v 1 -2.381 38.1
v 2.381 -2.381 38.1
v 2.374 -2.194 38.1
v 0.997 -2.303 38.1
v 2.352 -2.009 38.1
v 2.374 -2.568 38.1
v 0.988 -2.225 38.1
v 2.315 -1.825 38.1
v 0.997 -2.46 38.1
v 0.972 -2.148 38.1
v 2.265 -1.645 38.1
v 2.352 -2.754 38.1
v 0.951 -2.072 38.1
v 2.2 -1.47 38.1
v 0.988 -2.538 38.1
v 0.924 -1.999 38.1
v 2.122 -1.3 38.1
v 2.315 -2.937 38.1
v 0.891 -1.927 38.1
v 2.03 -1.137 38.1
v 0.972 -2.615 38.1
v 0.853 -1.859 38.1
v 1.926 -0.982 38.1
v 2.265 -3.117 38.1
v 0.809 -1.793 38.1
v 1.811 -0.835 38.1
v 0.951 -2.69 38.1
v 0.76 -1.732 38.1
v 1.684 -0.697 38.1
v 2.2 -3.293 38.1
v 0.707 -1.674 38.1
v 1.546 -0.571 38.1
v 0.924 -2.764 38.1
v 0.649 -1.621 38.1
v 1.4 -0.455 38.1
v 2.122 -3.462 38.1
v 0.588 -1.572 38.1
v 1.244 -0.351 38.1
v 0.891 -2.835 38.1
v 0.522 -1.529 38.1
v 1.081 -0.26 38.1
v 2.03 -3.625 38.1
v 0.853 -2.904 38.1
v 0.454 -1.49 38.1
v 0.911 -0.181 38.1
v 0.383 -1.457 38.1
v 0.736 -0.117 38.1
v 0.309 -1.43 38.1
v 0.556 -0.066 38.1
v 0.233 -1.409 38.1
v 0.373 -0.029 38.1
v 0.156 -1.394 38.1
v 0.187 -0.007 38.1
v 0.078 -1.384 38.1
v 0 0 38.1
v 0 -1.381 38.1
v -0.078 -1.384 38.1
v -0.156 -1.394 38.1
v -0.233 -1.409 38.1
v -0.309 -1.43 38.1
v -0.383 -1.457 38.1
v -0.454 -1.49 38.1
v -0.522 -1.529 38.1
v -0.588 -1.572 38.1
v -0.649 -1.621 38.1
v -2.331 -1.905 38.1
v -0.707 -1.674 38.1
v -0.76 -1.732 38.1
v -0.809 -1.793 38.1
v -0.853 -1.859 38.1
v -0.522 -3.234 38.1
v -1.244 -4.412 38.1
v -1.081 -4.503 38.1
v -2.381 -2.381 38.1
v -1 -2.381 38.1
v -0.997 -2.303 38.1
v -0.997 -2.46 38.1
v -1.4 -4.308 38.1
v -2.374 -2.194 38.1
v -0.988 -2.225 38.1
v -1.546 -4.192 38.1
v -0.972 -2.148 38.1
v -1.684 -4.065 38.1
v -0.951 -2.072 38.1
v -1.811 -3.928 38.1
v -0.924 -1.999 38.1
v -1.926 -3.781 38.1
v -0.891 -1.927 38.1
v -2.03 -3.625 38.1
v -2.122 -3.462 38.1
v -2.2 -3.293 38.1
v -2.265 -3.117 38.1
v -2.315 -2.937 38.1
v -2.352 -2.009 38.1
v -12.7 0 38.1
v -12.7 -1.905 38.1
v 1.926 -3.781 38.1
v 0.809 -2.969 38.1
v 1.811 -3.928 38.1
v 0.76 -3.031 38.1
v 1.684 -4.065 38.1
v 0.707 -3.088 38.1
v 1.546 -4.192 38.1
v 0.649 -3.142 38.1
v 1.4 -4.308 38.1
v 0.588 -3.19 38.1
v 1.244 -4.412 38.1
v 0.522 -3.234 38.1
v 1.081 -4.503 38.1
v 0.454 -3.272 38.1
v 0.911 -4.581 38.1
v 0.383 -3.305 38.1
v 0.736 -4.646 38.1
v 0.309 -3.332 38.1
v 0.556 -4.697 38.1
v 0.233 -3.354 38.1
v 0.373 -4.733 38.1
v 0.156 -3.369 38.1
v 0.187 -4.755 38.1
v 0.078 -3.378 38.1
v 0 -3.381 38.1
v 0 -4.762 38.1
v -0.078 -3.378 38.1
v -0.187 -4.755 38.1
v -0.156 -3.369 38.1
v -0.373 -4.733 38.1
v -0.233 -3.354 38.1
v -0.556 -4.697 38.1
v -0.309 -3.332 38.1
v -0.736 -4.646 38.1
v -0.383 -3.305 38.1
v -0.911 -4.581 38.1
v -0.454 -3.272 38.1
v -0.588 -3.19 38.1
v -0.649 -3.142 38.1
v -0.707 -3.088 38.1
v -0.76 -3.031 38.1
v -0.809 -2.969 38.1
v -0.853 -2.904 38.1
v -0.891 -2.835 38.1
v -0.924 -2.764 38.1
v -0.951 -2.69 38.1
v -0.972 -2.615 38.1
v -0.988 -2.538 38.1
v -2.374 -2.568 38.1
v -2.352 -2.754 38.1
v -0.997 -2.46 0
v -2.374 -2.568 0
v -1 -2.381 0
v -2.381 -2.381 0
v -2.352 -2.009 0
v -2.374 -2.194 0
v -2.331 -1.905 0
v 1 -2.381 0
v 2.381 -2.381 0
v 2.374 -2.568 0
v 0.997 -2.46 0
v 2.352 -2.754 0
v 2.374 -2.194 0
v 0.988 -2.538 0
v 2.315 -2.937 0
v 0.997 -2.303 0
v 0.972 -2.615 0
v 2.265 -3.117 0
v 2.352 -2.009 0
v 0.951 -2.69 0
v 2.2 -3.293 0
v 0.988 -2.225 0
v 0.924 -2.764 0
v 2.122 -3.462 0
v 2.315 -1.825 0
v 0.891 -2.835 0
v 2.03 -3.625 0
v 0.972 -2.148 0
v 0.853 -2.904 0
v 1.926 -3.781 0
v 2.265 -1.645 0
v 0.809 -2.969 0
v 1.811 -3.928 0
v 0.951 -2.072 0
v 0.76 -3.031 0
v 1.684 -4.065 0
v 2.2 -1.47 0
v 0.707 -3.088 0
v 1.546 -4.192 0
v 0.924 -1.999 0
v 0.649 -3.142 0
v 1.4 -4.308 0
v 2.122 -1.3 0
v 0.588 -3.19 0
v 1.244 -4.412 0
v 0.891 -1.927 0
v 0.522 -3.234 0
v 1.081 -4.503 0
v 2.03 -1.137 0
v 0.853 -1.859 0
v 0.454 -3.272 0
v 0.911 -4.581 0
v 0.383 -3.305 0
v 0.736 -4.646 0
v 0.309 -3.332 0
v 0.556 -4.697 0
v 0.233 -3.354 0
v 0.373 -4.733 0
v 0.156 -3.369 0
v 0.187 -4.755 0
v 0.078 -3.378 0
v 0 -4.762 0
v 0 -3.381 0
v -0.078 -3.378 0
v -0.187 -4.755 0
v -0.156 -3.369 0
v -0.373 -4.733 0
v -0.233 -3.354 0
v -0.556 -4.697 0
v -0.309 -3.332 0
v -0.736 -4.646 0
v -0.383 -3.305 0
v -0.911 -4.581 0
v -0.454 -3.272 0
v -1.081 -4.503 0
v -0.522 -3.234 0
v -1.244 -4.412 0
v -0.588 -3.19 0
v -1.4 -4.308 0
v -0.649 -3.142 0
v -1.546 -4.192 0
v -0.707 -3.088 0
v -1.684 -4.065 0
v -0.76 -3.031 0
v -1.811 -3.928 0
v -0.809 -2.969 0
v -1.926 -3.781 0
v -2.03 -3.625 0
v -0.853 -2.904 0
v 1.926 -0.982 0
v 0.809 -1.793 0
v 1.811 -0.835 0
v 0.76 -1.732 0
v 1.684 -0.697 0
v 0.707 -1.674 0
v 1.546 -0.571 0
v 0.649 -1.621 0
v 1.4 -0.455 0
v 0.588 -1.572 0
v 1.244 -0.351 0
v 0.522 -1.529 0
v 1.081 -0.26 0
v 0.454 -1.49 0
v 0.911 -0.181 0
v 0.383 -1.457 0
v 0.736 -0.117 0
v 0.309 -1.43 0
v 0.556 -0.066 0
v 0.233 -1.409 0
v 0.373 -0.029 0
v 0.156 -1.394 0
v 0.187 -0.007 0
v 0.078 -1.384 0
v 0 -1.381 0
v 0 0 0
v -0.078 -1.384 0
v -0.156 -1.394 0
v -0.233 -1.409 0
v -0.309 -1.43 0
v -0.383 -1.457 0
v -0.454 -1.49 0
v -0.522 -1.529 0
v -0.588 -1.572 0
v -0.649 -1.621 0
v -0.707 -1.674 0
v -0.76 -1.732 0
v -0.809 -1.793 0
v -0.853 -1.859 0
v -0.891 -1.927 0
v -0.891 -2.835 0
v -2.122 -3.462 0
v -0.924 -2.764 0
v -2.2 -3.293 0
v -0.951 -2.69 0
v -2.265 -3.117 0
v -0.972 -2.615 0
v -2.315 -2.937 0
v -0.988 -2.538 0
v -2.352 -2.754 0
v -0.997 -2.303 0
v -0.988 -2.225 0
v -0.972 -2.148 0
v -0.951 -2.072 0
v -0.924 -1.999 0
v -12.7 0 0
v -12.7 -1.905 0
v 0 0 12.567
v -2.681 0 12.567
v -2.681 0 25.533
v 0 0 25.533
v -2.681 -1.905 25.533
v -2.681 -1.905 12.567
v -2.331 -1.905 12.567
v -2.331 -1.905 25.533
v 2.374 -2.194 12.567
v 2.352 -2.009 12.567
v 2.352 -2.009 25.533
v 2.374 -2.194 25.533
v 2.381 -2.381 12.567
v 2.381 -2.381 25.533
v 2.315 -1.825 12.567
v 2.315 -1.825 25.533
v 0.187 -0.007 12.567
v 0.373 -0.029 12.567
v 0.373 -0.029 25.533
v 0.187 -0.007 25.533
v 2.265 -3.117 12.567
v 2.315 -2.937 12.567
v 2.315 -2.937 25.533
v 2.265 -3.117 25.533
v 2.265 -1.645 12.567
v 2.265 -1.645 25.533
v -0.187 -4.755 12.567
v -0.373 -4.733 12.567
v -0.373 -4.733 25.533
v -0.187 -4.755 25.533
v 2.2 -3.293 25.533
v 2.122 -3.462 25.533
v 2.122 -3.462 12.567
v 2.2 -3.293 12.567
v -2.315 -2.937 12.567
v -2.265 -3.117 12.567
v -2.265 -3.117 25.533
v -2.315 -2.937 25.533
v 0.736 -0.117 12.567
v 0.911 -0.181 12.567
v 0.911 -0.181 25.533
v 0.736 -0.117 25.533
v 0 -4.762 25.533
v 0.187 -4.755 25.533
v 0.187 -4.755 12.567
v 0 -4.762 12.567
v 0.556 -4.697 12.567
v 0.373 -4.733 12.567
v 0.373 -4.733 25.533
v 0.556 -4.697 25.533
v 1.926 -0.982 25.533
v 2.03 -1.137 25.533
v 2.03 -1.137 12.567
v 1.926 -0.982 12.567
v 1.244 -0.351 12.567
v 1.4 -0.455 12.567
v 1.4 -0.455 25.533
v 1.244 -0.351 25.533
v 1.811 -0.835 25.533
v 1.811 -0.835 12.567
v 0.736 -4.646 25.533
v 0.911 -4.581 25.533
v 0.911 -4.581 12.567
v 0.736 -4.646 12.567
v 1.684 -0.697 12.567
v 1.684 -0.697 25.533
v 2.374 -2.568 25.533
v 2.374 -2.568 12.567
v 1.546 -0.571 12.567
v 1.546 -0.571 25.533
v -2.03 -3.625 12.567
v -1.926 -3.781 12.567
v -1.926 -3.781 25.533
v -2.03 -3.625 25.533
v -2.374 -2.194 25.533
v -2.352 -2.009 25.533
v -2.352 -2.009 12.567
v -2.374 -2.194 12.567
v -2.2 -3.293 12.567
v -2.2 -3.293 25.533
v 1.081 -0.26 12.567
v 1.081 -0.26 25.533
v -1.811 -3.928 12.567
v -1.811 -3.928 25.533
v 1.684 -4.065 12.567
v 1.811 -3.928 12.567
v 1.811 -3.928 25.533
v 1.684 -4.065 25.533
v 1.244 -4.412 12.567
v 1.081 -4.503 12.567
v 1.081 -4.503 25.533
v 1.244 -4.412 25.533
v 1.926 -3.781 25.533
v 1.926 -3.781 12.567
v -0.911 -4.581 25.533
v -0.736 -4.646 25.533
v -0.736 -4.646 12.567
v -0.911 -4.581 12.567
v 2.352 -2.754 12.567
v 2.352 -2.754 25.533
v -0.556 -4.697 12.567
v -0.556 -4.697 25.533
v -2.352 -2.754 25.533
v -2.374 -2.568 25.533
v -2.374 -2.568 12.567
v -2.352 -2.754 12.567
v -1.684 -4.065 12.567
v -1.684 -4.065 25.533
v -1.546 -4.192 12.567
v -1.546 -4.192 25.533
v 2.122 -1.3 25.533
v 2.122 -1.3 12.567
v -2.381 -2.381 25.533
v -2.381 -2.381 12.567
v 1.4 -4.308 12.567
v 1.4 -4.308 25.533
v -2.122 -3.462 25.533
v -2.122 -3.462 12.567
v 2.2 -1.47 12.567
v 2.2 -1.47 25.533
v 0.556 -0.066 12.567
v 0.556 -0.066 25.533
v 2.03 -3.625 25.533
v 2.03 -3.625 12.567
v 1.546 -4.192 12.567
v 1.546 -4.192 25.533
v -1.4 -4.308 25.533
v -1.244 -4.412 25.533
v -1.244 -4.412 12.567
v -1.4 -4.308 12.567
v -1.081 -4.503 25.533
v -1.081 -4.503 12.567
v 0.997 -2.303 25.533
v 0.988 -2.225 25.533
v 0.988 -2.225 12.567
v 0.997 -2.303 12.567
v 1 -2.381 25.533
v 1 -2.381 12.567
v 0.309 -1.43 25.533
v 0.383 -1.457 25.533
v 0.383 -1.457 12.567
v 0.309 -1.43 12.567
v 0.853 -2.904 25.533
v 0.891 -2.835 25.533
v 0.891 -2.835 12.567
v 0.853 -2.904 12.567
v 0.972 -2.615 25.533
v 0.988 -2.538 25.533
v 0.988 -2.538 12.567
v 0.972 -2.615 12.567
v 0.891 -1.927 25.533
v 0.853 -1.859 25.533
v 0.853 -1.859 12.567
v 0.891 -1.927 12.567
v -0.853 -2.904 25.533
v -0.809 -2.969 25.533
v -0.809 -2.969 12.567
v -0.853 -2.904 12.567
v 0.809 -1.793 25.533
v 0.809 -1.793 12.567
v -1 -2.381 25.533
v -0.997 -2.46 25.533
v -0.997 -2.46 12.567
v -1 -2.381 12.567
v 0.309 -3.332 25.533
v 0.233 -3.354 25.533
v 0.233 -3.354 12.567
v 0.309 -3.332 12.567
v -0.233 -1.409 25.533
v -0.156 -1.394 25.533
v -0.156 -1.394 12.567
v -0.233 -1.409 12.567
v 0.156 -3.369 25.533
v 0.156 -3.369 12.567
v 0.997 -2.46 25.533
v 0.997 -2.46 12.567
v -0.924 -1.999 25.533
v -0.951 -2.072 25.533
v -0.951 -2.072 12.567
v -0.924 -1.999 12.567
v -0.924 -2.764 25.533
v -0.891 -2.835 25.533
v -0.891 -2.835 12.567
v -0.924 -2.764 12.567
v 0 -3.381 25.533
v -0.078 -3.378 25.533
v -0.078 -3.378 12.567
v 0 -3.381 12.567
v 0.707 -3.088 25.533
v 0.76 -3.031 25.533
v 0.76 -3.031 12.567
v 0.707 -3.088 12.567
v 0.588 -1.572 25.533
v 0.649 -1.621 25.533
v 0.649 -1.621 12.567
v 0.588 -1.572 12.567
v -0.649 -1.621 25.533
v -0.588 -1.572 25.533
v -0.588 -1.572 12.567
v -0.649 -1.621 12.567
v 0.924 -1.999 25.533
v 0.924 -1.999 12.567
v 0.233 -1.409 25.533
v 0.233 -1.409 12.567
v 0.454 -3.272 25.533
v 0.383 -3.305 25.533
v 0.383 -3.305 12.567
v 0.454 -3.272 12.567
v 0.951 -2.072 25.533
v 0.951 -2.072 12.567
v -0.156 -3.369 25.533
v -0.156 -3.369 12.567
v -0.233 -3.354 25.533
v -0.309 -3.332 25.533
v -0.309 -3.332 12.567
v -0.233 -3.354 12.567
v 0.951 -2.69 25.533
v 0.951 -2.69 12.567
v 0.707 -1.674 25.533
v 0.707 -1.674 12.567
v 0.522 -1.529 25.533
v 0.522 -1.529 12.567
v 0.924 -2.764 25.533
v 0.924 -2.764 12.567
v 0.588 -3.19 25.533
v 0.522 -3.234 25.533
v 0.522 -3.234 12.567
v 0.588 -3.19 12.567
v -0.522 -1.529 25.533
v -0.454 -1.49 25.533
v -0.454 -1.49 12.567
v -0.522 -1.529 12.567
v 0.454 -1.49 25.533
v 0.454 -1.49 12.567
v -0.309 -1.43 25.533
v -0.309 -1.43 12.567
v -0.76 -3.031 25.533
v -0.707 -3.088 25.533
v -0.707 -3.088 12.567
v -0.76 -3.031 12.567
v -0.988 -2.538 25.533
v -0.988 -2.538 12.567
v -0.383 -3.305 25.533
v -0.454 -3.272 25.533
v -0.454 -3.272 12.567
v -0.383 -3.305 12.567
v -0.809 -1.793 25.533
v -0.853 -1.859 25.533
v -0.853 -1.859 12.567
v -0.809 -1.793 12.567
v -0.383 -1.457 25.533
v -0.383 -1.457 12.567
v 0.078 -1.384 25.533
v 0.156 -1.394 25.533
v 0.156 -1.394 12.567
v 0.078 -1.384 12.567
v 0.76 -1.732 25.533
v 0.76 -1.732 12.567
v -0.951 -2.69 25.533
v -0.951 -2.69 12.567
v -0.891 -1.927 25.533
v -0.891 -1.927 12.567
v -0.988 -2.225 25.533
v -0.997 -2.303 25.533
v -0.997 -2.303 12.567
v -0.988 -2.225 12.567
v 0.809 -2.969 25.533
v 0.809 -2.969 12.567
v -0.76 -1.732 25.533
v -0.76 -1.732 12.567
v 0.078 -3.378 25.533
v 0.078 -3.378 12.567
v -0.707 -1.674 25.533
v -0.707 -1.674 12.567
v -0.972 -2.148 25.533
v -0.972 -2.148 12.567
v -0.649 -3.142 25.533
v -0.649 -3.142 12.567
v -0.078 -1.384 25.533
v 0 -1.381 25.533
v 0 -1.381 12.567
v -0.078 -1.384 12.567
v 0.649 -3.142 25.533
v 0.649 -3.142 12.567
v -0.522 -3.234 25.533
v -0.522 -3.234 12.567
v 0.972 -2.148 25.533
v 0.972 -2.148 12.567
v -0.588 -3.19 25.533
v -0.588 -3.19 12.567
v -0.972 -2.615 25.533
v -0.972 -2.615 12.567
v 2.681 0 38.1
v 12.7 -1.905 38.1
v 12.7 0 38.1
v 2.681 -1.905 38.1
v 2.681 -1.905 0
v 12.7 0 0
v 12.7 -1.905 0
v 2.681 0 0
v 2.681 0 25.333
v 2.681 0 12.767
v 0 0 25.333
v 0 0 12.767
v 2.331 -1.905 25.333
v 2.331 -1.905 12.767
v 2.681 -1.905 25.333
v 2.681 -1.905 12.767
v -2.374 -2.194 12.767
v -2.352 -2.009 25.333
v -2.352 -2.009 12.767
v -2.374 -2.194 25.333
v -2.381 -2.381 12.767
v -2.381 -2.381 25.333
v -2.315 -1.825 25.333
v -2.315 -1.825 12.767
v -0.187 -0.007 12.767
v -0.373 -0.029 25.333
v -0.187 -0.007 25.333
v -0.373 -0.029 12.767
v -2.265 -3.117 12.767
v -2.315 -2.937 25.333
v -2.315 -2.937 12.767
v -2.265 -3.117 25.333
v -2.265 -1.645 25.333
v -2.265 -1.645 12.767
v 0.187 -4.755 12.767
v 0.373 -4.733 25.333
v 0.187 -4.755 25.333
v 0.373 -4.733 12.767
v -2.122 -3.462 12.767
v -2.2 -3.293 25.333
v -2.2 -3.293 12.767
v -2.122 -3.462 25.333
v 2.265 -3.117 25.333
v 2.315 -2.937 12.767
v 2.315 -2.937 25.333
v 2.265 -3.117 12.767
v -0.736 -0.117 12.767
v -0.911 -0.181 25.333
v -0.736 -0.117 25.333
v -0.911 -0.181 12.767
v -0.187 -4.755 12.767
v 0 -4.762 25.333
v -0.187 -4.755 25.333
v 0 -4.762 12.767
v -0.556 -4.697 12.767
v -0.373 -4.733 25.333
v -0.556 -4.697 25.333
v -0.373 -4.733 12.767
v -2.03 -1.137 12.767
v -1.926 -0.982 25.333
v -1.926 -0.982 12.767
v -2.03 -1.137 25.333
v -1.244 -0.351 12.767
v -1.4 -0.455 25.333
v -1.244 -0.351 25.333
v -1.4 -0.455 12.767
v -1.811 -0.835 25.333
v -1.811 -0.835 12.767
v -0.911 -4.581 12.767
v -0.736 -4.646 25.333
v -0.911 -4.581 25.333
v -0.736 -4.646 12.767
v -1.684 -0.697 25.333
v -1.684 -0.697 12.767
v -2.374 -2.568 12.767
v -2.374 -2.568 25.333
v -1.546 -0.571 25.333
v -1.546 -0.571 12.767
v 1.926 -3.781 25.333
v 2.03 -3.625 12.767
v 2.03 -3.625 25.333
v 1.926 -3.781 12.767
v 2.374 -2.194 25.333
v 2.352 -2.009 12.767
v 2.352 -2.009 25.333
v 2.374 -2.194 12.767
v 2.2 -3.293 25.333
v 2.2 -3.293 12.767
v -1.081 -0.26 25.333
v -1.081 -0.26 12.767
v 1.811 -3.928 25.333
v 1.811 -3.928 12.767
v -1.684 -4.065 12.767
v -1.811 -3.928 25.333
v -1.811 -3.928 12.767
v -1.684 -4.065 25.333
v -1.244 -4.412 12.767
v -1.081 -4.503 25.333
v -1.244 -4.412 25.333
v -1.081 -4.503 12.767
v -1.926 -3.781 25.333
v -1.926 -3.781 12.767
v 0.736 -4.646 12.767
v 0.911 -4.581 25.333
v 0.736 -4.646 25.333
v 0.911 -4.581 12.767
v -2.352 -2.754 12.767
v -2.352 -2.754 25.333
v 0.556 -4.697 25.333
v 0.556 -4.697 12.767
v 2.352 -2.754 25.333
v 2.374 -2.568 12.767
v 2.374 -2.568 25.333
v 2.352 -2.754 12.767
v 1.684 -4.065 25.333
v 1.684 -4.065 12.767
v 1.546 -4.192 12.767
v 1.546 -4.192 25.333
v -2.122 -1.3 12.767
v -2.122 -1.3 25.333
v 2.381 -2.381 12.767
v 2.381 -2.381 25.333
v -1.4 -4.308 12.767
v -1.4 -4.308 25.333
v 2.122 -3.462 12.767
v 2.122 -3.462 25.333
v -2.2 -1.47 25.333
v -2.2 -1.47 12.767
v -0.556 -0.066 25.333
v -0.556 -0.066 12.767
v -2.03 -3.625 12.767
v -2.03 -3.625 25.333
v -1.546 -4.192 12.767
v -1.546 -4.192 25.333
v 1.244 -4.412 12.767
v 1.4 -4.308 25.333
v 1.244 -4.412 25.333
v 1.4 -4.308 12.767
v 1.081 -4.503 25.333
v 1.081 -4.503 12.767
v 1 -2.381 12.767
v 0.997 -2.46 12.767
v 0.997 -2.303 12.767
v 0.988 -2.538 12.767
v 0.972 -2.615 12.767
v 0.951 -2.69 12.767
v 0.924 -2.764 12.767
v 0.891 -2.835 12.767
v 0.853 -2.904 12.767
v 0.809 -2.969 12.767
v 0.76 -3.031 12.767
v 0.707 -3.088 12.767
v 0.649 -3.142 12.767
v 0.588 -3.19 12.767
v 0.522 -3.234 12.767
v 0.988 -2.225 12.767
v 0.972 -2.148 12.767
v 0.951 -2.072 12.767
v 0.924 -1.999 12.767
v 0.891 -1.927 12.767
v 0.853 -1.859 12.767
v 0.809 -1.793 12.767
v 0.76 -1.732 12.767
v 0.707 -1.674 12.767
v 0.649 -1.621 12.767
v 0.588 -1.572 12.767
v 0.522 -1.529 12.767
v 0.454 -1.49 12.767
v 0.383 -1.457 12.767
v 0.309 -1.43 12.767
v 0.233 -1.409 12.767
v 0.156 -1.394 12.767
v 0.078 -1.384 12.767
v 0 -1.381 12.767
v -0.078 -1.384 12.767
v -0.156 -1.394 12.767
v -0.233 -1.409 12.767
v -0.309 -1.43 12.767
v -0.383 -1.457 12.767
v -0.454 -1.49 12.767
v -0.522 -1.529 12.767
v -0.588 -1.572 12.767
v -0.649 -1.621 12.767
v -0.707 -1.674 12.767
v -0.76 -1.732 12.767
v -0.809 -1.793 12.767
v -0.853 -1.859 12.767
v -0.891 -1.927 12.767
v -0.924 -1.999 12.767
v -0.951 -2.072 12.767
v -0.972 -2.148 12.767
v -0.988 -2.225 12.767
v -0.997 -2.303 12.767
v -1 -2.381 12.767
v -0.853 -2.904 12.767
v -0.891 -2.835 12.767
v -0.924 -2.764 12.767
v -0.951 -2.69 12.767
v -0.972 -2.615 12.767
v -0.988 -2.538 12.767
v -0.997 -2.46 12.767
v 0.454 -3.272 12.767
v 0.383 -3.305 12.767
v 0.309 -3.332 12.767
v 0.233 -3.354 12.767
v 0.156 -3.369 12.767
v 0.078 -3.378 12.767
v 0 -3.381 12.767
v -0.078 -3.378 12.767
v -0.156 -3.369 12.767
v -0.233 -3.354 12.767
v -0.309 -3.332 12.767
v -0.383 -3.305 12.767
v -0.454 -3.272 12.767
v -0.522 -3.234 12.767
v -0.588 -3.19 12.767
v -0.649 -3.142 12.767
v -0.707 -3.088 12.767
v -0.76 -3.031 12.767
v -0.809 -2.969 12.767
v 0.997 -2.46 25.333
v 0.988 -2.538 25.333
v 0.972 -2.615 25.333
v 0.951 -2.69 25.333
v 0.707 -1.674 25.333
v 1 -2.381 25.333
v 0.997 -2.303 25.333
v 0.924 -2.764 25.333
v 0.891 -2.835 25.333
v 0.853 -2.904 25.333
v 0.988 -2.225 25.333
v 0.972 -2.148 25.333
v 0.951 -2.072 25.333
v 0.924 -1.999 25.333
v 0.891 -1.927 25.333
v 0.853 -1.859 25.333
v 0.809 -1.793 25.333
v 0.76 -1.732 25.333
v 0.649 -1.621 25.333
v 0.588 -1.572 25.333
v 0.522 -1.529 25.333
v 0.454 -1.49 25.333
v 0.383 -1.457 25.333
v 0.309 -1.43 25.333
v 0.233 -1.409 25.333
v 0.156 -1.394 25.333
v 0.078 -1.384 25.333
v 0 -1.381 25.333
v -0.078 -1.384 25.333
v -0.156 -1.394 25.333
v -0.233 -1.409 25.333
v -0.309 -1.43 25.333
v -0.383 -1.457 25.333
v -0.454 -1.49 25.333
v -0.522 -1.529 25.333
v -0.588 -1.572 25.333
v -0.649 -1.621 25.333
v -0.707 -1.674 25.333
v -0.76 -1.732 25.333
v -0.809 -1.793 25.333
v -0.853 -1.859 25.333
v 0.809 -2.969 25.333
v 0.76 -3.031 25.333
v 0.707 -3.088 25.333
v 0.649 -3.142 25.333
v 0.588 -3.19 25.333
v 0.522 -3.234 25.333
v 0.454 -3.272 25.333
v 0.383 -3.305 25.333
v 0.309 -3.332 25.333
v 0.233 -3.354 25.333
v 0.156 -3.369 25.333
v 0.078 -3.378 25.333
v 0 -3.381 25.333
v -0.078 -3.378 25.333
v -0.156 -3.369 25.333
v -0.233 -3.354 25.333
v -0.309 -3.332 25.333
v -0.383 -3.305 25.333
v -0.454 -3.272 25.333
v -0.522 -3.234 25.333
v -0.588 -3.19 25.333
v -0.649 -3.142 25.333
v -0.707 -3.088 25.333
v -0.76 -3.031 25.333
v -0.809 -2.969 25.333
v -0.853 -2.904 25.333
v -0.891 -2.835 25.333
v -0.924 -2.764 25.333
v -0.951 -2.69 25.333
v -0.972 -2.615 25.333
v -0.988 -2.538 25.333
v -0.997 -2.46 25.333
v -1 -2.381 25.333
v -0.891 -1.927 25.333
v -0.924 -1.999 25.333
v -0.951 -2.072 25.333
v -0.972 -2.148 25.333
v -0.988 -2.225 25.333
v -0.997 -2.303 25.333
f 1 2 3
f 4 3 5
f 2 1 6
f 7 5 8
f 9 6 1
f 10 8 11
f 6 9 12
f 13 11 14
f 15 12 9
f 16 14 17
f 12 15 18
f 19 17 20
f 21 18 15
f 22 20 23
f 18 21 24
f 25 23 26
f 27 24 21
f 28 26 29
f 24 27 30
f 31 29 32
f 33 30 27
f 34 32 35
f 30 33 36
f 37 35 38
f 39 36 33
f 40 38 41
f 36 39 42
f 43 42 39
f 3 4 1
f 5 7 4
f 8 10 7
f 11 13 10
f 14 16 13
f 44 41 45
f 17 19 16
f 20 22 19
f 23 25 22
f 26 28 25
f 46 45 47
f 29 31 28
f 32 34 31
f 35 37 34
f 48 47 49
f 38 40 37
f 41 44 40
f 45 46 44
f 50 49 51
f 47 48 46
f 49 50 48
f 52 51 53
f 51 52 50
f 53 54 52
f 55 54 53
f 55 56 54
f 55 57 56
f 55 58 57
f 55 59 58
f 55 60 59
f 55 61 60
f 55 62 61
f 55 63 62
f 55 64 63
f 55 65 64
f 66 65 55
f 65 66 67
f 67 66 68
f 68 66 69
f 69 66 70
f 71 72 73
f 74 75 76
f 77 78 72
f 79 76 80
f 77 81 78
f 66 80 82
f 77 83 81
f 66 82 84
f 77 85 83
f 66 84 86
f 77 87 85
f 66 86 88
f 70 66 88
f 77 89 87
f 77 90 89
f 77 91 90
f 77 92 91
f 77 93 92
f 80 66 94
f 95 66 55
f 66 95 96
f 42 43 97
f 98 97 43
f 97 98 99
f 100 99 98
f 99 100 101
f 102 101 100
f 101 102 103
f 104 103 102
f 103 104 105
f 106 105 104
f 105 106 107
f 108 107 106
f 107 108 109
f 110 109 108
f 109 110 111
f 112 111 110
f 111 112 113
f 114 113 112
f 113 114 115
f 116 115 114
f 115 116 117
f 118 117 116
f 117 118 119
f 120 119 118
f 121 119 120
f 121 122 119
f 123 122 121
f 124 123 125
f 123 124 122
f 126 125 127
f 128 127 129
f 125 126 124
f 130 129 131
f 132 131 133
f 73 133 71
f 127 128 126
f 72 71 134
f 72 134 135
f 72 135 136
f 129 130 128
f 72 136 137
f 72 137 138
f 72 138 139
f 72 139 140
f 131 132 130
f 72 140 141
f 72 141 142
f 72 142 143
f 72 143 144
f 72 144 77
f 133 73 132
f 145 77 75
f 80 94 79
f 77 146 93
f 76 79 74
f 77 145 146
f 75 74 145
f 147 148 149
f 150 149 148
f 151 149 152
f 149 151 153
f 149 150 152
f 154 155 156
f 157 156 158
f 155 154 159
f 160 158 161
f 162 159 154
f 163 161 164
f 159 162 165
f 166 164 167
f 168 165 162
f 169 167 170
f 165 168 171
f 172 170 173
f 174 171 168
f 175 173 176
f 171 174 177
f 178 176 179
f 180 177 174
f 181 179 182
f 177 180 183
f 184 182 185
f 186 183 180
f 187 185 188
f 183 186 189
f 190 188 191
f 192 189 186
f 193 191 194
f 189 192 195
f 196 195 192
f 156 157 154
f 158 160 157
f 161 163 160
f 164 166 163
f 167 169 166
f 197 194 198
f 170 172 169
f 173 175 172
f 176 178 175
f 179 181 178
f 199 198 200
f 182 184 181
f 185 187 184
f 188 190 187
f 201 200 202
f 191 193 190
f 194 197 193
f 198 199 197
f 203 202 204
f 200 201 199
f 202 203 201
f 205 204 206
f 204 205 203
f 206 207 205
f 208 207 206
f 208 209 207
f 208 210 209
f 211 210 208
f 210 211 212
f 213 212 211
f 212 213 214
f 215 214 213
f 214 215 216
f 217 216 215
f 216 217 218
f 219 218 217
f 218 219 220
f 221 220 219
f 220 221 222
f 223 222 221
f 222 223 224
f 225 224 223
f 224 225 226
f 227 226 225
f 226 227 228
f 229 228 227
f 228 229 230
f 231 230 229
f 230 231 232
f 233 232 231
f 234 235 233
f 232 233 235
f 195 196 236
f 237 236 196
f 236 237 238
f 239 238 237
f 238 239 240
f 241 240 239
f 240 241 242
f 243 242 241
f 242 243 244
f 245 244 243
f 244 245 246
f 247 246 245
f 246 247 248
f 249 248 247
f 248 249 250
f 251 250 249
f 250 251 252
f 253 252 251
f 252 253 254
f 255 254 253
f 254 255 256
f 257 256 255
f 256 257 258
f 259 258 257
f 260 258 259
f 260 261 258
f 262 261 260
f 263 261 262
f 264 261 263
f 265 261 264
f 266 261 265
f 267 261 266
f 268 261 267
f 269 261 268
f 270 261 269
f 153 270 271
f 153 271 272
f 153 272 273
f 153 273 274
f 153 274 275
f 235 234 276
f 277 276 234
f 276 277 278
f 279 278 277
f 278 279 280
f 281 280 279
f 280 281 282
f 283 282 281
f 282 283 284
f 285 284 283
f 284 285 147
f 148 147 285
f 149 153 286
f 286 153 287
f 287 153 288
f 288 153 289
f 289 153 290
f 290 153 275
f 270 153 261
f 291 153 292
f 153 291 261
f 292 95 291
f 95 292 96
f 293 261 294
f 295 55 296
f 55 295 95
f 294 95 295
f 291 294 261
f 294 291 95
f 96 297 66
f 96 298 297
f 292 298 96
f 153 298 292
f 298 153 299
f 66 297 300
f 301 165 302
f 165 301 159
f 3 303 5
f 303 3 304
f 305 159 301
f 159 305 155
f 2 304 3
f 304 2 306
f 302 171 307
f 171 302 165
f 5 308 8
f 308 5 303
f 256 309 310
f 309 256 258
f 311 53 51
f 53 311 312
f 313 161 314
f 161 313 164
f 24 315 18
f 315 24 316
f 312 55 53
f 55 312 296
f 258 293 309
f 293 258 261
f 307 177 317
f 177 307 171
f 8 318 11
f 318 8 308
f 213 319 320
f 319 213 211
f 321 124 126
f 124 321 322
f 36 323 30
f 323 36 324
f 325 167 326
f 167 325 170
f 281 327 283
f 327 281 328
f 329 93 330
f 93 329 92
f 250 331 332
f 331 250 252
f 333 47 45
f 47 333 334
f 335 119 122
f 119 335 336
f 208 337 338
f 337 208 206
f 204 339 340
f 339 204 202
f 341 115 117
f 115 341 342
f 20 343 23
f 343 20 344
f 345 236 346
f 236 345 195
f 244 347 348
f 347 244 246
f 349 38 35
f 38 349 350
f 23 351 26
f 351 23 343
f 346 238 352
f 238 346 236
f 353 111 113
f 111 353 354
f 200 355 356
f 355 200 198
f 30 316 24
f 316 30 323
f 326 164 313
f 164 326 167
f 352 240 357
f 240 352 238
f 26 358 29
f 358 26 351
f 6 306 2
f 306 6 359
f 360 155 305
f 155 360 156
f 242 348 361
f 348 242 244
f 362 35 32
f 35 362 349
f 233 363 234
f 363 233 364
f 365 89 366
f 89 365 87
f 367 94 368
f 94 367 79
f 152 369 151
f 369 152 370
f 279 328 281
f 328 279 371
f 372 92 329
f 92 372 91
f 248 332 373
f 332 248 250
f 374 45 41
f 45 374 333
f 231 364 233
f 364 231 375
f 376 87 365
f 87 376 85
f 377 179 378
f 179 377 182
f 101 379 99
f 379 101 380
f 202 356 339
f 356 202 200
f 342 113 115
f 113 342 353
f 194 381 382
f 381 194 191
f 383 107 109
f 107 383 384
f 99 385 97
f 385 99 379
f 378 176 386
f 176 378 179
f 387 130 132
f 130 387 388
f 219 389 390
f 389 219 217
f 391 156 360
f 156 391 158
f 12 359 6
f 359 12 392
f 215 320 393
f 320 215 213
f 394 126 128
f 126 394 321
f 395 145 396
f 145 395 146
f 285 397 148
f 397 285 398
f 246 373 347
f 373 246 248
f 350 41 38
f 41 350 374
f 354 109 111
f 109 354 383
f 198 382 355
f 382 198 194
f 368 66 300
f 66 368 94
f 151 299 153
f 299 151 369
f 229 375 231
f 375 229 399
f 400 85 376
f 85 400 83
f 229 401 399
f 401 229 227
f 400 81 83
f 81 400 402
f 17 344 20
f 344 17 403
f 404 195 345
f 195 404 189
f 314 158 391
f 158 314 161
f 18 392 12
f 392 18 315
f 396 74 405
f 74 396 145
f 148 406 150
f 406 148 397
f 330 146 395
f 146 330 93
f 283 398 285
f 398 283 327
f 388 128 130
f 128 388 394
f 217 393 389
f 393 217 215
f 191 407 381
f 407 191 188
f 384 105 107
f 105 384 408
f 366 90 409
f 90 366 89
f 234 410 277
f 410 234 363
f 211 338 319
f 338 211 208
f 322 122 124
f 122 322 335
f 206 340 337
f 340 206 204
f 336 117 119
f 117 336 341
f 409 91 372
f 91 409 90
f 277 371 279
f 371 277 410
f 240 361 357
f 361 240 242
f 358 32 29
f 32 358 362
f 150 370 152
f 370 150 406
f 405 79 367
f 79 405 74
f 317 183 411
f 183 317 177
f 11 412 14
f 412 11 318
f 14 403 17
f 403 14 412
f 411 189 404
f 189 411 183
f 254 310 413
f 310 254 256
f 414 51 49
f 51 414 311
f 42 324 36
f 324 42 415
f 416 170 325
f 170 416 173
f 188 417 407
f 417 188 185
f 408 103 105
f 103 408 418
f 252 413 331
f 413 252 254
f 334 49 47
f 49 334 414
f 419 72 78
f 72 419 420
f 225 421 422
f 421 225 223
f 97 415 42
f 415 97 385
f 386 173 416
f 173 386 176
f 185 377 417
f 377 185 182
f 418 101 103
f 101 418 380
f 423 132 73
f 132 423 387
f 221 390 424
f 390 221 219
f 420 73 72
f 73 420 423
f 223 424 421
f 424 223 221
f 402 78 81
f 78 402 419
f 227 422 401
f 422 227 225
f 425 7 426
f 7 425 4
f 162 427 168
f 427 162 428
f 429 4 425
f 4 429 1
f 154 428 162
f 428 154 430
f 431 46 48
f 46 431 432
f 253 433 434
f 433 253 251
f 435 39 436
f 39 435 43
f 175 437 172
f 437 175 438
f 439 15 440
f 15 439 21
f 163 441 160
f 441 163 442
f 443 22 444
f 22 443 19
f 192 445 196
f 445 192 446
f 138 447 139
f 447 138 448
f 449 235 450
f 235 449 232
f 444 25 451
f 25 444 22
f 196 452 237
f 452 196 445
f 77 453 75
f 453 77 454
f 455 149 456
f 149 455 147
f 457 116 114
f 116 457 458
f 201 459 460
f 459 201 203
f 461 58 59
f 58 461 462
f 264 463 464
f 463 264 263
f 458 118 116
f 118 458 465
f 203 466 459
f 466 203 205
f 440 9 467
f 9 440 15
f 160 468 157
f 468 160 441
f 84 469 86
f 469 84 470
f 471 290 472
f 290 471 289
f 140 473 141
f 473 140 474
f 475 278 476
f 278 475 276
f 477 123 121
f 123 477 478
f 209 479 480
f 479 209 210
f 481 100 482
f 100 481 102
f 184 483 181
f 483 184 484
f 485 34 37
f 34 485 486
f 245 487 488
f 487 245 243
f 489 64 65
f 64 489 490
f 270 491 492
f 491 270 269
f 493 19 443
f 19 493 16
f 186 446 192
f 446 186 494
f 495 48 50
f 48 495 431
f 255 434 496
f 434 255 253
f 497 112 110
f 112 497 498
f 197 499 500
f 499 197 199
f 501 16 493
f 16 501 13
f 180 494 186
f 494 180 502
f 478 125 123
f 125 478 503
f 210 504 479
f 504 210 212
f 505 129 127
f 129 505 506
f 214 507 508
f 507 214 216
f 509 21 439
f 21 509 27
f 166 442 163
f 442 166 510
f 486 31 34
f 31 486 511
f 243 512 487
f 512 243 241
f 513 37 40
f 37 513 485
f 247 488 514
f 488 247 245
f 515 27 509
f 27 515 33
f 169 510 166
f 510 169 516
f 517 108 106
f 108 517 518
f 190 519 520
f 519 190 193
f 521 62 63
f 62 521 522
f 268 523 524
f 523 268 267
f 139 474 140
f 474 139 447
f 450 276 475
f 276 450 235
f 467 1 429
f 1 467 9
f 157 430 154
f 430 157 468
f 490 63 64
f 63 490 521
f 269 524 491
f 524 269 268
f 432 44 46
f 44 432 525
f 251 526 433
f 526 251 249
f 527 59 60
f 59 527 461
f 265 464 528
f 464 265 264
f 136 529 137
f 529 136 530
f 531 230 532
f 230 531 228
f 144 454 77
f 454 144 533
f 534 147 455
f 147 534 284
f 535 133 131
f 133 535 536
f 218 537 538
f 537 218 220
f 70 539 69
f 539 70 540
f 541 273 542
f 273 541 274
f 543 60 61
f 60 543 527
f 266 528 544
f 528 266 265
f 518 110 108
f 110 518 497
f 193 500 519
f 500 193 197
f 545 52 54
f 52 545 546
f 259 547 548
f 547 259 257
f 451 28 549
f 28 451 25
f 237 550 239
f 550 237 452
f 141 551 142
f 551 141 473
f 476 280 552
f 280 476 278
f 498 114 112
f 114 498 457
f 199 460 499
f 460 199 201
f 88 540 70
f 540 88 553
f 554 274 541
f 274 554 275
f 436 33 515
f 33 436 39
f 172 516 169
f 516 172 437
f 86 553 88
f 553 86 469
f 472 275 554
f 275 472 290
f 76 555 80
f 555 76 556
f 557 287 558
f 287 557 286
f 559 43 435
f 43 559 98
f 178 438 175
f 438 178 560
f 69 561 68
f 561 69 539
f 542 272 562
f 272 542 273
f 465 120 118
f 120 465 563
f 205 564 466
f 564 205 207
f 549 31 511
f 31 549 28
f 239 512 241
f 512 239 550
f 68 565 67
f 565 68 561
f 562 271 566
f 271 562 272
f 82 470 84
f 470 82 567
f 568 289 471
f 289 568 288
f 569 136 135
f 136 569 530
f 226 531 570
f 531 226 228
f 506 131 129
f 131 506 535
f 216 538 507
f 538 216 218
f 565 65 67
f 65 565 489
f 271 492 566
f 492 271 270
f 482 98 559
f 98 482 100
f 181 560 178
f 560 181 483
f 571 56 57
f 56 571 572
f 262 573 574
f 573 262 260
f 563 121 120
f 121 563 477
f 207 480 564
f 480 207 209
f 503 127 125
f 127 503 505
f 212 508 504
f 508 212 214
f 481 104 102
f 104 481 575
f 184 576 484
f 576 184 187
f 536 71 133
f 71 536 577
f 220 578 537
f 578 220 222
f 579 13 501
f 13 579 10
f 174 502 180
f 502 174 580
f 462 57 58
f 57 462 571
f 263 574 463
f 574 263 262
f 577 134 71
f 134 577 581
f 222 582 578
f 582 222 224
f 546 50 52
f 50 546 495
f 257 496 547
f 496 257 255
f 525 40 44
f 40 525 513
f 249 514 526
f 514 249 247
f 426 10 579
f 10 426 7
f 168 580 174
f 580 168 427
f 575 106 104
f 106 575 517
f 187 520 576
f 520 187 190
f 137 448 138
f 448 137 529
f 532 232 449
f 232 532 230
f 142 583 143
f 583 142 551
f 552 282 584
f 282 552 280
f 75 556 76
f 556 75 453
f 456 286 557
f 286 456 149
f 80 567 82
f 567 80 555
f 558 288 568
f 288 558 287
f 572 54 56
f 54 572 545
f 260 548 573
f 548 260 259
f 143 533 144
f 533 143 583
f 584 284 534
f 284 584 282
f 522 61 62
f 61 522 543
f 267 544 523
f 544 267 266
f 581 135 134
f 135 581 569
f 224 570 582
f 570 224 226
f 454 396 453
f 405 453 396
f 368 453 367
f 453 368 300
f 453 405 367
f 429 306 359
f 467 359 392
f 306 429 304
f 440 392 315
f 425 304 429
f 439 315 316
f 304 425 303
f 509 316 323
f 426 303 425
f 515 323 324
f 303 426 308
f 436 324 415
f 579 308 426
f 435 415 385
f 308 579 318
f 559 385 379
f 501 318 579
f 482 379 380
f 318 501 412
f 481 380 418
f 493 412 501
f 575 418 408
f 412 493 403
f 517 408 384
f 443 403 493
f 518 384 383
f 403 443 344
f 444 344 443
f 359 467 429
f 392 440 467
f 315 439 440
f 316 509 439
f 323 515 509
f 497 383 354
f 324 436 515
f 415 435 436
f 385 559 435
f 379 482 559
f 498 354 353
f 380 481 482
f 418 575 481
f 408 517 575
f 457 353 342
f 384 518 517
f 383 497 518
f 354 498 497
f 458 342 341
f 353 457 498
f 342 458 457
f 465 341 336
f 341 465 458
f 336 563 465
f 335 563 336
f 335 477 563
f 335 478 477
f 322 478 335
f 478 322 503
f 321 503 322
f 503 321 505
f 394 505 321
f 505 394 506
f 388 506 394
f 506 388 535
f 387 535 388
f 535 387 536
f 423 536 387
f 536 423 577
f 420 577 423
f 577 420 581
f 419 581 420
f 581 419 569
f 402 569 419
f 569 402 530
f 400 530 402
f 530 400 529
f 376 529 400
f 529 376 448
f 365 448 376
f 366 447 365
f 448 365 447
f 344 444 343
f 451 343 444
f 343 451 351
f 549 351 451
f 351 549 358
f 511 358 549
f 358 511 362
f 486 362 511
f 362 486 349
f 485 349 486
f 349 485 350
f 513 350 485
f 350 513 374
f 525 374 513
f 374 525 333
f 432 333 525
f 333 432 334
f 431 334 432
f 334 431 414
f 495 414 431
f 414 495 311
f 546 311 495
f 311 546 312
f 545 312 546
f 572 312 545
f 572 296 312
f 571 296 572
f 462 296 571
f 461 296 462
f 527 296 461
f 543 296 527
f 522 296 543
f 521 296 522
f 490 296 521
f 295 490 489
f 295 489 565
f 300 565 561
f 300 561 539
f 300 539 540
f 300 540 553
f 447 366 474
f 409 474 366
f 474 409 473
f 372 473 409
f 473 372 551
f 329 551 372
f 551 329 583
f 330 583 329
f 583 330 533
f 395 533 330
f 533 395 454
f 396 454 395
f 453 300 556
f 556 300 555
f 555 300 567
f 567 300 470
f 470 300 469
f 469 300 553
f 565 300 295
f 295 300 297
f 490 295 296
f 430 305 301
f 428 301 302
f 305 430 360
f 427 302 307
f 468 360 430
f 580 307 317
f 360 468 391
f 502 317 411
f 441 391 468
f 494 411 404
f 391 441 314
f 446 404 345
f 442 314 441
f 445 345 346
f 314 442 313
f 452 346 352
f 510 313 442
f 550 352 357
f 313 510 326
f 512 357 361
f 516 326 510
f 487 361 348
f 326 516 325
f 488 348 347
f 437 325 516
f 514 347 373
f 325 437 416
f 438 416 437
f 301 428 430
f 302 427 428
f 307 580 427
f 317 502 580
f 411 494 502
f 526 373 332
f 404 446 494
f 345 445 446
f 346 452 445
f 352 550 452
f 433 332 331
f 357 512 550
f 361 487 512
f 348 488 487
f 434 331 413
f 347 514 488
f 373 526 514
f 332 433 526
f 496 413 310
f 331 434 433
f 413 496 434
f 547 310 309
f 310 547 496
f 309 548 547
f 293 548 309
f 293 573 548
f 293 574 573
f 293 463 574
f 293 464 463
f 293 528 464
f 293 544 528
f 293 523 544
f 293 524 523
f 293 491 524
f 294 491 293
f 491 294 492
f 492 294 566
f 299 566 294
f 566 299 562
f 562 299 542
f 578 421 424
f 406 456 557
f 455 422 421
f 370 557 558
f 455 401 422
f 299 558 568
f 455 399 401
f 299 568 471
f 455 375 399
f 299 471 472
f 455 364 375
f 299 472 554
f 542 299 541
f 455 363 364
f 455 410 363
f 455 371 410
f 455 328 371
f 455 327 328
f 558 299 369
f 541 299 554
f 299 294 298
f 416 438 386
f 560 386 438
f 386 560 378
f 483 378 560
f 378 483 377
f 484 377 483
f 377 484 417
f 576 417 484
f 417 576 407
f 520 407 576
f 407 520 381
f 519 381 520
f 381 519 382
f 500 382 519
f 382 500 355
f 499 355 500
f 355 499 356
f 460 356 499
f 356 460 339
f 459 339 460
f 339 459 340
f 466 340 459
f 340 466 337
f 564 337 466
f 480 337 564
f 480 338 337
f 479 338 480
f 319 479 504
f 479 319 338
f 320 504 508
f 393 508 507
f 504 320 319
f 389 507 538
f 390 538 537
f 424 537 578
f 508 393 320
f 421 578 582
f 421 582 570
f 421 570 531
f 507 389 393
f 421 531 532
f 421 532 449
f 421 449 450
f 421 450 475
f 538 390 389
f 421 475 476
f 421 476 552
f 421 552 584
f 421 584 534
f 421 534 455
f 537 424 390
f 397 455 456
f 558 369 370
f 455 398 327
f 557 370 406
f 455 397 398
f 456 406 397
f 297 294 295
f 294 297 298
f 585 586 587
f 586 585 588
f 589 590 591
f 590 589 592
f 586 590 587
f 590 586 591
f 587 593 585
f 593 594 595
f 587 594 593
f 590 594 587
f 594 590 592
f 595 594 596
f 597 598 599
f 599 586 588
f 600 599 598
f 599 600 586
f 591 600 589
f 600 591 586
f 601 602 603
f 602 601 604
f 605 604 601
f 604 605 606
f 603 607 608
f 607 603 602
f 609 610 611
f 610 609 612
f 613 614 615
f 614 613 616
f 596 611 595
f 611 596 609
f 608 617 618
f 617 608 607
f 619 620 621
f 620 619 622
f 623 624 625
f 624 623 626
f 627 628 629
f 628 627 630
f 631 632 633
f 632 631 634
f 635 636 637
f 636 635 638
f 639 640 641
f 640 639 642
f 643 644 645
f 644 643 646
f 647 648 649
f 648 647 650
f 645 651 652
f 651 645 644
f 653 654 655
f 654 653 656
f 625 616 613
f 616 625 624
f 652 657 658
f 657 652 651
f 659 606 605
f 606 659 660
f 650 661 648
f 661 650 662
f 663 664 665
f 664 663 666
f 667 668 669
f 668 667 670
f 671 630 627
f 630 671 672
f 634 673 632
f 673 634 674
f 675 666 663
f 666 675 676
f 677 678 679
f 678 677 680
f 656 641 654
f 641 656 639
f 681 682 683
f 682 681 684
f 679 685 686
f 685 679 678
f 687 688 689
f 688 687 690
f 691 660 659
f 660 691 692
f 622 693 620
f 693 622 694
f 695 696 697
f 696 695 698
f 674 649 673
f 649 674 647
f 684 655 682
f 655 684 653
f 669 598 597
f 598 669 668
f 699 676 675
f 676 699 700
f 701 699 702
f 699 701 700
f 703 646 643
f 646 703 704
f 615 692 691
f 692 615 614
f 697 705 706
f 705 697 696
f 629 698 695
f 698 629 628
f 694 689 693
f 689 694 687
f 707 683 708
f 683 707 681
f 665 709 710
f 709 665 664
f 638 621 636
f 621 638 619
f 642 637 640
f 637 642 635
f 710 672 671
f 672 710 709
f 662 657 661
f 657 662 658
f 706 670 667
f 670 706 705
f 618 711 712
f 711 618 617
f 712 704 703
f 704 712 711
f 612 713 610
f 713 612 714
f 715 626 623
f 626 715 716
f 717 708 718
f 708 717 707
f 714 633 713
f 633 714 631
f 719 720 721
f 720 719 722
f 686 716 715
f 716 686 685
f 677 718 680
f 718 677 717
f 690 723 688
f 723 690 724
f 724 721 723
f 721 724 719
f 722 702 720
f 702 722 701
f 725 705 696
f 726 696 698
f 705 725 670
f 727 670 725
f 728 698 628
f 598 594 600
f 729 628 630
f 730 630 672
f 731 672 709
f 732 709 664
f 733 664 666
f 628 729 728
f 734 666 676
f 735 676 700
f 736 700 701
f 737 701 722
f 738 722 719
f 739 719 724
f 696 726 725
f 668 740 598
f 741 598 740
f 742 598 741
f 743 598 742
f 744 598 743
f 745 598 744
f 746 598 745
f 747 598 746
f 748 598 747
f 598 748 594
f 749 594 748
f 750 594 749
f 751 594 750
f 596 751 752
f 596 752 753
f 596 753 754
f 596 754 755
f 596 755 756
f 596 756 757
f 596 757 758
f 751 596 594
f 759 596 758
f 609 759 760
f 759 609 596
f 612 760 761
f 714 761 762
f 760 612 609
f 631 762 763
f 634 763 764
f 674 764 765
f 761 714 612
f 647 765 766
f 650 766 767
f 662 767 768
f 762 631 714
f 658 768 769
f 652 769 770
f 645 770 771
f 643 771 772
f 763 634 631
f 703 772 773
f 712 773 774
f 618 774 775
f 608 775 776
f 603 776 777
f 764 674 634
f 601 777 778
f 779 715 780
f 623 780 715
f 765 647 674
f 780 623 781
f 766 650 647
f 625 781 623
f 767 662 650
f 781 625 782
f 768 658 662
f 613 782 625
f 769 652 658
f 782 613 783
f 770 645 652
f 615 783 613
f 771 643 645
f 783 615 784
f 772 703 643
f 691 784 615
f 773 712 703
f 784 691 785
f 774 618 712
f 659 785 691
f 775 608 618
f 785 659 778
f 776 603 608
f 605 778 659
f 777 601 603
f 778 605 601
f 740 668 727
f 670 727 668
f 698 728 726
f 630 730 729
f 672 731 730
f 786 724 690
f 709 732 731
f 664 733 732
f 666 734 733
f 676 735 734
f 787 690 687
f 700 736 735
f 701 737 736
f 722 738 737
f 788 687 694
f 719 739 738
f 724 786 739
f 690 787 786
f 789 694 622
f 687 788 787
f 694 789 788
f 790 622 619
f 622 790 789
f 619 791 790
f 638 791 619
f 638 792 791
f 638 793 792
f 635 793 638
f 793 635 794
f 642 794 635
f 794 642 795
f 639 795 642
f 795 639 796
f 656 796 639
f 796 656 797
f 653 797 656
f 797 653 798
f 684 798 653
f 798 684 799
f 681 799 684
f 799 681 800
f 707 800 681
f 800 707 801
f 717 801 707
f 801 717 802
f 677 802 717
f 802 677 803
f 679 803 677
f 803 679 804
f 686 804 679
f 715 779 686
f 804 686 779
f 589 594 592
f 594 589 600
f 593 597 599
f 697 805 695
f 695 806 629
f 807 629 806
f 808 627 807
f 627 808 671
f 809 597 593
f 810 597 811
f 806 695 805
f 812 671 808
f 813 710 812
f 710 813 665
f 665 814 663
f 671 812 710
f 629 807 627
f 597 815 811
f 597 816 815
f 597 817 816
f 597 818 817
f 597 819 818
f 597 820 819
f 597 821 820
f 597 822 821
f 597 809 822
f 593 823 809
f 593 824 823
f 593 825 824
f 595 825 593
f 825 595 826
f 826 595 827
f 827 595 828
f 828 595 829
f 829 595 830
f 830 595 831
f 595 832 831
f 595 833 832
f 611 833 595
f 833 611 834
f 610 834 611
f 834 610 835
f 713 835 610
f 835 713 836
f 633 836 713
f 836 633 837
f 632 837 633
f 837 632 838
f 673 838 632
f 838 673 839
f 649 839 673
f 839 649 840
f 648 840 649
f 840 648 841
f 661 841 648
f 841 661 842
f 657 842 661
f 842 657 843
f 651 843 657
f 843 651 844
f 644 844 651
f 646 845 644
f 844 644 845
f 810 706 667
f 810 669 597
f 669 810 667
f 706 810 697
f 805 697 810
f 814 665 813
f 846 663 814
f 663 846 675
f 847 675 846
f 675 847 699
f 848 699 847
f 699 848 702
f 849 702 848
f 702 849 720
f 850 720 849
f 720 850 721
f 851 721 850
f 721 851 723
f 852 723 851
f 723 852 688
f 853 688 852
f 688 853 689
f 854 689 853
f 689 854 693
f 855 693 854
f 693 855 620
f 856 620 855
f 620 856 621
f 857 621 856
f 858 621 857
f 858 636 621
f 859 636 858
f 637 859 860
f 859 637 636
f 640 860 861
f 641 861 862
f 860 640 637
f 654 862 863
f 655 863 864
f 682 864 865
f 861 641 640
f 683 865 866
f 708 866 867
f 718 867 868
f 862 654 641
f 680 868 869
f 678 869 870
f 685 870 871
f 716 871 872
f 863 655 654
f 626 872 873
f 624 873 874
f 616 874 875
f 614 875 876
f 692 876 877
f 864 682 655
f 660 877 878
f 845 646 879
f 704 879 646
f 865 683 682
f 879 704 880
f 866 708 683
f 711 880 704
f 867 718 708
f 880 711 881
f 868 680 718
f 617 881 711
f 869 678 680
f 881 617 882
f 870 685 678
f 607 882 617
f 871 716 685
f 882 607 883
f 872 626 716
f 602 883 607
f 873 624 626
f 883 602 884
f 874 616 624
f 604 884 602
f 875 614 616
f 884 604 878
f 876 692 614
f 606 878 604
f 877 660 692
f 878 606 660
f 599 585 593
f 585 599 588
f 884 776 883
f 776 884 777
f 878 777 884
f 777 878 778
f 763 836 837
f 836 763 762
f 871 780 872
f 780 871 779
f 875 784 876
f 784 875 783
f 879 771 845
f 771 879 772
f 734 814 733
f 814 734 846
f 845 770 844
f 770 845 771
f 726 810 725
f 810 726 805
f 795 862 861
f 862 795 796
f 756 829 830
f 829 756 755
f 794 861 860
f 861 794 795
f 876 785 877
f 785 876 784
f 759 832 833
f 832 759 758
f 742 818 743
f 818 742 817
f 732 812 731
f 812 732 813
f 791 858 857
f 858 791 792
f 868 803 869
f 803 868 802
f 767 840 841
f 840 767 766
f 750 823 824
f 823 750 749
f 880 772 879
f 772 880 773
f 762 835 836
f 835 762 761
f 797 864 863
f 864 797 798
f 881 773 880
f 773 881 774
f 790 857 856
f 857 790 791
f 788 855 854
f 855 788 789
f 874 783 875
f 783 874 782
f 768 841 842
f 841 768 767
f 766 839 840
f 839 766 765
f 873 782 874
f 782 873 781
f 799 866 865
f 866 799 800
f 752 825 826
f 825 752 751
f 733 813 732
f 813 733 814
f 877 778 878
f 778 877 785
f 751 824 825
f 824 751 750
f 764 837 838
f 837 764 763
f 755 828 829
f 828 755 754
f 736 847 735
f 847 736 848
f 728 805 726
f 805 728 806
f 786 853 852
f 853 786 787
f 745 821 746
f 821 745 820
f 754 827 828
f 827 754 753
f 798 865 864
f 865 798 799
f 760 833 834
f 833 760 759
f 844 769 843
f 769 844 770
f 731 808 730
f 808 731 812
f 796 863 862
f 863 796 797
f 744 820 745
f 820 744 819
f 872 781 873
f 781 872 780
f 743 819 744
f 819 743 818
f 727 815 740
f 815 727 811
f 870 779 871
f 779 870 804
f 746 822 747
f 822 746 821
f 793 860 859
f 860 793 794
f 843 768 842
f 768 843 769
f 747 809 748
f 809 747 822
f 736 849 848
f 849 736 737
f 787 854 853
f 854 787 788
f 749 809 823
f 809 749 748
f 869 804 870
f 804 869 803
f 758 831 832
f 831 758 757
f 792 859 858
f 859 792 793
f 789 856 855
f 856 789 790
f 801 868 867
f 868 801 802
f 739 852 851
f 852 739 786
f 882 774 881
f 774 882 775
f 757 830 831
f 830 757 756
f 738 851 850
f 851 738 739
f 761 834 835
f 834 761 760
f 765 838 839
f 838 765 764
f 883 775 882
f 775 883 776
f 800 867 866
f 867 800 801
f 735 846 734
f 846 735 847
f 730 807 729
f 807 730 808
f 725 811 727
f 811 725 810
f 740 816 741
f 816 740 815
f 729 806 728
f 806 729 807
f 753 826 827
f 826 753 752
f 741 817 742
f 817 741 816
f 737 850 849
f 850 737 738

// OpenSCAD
$fn = 80;
use <./modules/hingePairBase.scad>;


mmToIn = 25.4;

module hinge()
{
     hingedPlatePair(plateWidth           = 0.5     * mmToIn, 
                     plateHeight          = 1.5     * mmToIn, 
                     plateThickness       = 0.075   * mmToIn,
                     hingeOutsideDiameter = 0.1875  * mmToIn,
                     hingeInsideDiamter   = 0.125   * mmToIn,
                     hingeSectionCount    = 3);
}
hinge();
